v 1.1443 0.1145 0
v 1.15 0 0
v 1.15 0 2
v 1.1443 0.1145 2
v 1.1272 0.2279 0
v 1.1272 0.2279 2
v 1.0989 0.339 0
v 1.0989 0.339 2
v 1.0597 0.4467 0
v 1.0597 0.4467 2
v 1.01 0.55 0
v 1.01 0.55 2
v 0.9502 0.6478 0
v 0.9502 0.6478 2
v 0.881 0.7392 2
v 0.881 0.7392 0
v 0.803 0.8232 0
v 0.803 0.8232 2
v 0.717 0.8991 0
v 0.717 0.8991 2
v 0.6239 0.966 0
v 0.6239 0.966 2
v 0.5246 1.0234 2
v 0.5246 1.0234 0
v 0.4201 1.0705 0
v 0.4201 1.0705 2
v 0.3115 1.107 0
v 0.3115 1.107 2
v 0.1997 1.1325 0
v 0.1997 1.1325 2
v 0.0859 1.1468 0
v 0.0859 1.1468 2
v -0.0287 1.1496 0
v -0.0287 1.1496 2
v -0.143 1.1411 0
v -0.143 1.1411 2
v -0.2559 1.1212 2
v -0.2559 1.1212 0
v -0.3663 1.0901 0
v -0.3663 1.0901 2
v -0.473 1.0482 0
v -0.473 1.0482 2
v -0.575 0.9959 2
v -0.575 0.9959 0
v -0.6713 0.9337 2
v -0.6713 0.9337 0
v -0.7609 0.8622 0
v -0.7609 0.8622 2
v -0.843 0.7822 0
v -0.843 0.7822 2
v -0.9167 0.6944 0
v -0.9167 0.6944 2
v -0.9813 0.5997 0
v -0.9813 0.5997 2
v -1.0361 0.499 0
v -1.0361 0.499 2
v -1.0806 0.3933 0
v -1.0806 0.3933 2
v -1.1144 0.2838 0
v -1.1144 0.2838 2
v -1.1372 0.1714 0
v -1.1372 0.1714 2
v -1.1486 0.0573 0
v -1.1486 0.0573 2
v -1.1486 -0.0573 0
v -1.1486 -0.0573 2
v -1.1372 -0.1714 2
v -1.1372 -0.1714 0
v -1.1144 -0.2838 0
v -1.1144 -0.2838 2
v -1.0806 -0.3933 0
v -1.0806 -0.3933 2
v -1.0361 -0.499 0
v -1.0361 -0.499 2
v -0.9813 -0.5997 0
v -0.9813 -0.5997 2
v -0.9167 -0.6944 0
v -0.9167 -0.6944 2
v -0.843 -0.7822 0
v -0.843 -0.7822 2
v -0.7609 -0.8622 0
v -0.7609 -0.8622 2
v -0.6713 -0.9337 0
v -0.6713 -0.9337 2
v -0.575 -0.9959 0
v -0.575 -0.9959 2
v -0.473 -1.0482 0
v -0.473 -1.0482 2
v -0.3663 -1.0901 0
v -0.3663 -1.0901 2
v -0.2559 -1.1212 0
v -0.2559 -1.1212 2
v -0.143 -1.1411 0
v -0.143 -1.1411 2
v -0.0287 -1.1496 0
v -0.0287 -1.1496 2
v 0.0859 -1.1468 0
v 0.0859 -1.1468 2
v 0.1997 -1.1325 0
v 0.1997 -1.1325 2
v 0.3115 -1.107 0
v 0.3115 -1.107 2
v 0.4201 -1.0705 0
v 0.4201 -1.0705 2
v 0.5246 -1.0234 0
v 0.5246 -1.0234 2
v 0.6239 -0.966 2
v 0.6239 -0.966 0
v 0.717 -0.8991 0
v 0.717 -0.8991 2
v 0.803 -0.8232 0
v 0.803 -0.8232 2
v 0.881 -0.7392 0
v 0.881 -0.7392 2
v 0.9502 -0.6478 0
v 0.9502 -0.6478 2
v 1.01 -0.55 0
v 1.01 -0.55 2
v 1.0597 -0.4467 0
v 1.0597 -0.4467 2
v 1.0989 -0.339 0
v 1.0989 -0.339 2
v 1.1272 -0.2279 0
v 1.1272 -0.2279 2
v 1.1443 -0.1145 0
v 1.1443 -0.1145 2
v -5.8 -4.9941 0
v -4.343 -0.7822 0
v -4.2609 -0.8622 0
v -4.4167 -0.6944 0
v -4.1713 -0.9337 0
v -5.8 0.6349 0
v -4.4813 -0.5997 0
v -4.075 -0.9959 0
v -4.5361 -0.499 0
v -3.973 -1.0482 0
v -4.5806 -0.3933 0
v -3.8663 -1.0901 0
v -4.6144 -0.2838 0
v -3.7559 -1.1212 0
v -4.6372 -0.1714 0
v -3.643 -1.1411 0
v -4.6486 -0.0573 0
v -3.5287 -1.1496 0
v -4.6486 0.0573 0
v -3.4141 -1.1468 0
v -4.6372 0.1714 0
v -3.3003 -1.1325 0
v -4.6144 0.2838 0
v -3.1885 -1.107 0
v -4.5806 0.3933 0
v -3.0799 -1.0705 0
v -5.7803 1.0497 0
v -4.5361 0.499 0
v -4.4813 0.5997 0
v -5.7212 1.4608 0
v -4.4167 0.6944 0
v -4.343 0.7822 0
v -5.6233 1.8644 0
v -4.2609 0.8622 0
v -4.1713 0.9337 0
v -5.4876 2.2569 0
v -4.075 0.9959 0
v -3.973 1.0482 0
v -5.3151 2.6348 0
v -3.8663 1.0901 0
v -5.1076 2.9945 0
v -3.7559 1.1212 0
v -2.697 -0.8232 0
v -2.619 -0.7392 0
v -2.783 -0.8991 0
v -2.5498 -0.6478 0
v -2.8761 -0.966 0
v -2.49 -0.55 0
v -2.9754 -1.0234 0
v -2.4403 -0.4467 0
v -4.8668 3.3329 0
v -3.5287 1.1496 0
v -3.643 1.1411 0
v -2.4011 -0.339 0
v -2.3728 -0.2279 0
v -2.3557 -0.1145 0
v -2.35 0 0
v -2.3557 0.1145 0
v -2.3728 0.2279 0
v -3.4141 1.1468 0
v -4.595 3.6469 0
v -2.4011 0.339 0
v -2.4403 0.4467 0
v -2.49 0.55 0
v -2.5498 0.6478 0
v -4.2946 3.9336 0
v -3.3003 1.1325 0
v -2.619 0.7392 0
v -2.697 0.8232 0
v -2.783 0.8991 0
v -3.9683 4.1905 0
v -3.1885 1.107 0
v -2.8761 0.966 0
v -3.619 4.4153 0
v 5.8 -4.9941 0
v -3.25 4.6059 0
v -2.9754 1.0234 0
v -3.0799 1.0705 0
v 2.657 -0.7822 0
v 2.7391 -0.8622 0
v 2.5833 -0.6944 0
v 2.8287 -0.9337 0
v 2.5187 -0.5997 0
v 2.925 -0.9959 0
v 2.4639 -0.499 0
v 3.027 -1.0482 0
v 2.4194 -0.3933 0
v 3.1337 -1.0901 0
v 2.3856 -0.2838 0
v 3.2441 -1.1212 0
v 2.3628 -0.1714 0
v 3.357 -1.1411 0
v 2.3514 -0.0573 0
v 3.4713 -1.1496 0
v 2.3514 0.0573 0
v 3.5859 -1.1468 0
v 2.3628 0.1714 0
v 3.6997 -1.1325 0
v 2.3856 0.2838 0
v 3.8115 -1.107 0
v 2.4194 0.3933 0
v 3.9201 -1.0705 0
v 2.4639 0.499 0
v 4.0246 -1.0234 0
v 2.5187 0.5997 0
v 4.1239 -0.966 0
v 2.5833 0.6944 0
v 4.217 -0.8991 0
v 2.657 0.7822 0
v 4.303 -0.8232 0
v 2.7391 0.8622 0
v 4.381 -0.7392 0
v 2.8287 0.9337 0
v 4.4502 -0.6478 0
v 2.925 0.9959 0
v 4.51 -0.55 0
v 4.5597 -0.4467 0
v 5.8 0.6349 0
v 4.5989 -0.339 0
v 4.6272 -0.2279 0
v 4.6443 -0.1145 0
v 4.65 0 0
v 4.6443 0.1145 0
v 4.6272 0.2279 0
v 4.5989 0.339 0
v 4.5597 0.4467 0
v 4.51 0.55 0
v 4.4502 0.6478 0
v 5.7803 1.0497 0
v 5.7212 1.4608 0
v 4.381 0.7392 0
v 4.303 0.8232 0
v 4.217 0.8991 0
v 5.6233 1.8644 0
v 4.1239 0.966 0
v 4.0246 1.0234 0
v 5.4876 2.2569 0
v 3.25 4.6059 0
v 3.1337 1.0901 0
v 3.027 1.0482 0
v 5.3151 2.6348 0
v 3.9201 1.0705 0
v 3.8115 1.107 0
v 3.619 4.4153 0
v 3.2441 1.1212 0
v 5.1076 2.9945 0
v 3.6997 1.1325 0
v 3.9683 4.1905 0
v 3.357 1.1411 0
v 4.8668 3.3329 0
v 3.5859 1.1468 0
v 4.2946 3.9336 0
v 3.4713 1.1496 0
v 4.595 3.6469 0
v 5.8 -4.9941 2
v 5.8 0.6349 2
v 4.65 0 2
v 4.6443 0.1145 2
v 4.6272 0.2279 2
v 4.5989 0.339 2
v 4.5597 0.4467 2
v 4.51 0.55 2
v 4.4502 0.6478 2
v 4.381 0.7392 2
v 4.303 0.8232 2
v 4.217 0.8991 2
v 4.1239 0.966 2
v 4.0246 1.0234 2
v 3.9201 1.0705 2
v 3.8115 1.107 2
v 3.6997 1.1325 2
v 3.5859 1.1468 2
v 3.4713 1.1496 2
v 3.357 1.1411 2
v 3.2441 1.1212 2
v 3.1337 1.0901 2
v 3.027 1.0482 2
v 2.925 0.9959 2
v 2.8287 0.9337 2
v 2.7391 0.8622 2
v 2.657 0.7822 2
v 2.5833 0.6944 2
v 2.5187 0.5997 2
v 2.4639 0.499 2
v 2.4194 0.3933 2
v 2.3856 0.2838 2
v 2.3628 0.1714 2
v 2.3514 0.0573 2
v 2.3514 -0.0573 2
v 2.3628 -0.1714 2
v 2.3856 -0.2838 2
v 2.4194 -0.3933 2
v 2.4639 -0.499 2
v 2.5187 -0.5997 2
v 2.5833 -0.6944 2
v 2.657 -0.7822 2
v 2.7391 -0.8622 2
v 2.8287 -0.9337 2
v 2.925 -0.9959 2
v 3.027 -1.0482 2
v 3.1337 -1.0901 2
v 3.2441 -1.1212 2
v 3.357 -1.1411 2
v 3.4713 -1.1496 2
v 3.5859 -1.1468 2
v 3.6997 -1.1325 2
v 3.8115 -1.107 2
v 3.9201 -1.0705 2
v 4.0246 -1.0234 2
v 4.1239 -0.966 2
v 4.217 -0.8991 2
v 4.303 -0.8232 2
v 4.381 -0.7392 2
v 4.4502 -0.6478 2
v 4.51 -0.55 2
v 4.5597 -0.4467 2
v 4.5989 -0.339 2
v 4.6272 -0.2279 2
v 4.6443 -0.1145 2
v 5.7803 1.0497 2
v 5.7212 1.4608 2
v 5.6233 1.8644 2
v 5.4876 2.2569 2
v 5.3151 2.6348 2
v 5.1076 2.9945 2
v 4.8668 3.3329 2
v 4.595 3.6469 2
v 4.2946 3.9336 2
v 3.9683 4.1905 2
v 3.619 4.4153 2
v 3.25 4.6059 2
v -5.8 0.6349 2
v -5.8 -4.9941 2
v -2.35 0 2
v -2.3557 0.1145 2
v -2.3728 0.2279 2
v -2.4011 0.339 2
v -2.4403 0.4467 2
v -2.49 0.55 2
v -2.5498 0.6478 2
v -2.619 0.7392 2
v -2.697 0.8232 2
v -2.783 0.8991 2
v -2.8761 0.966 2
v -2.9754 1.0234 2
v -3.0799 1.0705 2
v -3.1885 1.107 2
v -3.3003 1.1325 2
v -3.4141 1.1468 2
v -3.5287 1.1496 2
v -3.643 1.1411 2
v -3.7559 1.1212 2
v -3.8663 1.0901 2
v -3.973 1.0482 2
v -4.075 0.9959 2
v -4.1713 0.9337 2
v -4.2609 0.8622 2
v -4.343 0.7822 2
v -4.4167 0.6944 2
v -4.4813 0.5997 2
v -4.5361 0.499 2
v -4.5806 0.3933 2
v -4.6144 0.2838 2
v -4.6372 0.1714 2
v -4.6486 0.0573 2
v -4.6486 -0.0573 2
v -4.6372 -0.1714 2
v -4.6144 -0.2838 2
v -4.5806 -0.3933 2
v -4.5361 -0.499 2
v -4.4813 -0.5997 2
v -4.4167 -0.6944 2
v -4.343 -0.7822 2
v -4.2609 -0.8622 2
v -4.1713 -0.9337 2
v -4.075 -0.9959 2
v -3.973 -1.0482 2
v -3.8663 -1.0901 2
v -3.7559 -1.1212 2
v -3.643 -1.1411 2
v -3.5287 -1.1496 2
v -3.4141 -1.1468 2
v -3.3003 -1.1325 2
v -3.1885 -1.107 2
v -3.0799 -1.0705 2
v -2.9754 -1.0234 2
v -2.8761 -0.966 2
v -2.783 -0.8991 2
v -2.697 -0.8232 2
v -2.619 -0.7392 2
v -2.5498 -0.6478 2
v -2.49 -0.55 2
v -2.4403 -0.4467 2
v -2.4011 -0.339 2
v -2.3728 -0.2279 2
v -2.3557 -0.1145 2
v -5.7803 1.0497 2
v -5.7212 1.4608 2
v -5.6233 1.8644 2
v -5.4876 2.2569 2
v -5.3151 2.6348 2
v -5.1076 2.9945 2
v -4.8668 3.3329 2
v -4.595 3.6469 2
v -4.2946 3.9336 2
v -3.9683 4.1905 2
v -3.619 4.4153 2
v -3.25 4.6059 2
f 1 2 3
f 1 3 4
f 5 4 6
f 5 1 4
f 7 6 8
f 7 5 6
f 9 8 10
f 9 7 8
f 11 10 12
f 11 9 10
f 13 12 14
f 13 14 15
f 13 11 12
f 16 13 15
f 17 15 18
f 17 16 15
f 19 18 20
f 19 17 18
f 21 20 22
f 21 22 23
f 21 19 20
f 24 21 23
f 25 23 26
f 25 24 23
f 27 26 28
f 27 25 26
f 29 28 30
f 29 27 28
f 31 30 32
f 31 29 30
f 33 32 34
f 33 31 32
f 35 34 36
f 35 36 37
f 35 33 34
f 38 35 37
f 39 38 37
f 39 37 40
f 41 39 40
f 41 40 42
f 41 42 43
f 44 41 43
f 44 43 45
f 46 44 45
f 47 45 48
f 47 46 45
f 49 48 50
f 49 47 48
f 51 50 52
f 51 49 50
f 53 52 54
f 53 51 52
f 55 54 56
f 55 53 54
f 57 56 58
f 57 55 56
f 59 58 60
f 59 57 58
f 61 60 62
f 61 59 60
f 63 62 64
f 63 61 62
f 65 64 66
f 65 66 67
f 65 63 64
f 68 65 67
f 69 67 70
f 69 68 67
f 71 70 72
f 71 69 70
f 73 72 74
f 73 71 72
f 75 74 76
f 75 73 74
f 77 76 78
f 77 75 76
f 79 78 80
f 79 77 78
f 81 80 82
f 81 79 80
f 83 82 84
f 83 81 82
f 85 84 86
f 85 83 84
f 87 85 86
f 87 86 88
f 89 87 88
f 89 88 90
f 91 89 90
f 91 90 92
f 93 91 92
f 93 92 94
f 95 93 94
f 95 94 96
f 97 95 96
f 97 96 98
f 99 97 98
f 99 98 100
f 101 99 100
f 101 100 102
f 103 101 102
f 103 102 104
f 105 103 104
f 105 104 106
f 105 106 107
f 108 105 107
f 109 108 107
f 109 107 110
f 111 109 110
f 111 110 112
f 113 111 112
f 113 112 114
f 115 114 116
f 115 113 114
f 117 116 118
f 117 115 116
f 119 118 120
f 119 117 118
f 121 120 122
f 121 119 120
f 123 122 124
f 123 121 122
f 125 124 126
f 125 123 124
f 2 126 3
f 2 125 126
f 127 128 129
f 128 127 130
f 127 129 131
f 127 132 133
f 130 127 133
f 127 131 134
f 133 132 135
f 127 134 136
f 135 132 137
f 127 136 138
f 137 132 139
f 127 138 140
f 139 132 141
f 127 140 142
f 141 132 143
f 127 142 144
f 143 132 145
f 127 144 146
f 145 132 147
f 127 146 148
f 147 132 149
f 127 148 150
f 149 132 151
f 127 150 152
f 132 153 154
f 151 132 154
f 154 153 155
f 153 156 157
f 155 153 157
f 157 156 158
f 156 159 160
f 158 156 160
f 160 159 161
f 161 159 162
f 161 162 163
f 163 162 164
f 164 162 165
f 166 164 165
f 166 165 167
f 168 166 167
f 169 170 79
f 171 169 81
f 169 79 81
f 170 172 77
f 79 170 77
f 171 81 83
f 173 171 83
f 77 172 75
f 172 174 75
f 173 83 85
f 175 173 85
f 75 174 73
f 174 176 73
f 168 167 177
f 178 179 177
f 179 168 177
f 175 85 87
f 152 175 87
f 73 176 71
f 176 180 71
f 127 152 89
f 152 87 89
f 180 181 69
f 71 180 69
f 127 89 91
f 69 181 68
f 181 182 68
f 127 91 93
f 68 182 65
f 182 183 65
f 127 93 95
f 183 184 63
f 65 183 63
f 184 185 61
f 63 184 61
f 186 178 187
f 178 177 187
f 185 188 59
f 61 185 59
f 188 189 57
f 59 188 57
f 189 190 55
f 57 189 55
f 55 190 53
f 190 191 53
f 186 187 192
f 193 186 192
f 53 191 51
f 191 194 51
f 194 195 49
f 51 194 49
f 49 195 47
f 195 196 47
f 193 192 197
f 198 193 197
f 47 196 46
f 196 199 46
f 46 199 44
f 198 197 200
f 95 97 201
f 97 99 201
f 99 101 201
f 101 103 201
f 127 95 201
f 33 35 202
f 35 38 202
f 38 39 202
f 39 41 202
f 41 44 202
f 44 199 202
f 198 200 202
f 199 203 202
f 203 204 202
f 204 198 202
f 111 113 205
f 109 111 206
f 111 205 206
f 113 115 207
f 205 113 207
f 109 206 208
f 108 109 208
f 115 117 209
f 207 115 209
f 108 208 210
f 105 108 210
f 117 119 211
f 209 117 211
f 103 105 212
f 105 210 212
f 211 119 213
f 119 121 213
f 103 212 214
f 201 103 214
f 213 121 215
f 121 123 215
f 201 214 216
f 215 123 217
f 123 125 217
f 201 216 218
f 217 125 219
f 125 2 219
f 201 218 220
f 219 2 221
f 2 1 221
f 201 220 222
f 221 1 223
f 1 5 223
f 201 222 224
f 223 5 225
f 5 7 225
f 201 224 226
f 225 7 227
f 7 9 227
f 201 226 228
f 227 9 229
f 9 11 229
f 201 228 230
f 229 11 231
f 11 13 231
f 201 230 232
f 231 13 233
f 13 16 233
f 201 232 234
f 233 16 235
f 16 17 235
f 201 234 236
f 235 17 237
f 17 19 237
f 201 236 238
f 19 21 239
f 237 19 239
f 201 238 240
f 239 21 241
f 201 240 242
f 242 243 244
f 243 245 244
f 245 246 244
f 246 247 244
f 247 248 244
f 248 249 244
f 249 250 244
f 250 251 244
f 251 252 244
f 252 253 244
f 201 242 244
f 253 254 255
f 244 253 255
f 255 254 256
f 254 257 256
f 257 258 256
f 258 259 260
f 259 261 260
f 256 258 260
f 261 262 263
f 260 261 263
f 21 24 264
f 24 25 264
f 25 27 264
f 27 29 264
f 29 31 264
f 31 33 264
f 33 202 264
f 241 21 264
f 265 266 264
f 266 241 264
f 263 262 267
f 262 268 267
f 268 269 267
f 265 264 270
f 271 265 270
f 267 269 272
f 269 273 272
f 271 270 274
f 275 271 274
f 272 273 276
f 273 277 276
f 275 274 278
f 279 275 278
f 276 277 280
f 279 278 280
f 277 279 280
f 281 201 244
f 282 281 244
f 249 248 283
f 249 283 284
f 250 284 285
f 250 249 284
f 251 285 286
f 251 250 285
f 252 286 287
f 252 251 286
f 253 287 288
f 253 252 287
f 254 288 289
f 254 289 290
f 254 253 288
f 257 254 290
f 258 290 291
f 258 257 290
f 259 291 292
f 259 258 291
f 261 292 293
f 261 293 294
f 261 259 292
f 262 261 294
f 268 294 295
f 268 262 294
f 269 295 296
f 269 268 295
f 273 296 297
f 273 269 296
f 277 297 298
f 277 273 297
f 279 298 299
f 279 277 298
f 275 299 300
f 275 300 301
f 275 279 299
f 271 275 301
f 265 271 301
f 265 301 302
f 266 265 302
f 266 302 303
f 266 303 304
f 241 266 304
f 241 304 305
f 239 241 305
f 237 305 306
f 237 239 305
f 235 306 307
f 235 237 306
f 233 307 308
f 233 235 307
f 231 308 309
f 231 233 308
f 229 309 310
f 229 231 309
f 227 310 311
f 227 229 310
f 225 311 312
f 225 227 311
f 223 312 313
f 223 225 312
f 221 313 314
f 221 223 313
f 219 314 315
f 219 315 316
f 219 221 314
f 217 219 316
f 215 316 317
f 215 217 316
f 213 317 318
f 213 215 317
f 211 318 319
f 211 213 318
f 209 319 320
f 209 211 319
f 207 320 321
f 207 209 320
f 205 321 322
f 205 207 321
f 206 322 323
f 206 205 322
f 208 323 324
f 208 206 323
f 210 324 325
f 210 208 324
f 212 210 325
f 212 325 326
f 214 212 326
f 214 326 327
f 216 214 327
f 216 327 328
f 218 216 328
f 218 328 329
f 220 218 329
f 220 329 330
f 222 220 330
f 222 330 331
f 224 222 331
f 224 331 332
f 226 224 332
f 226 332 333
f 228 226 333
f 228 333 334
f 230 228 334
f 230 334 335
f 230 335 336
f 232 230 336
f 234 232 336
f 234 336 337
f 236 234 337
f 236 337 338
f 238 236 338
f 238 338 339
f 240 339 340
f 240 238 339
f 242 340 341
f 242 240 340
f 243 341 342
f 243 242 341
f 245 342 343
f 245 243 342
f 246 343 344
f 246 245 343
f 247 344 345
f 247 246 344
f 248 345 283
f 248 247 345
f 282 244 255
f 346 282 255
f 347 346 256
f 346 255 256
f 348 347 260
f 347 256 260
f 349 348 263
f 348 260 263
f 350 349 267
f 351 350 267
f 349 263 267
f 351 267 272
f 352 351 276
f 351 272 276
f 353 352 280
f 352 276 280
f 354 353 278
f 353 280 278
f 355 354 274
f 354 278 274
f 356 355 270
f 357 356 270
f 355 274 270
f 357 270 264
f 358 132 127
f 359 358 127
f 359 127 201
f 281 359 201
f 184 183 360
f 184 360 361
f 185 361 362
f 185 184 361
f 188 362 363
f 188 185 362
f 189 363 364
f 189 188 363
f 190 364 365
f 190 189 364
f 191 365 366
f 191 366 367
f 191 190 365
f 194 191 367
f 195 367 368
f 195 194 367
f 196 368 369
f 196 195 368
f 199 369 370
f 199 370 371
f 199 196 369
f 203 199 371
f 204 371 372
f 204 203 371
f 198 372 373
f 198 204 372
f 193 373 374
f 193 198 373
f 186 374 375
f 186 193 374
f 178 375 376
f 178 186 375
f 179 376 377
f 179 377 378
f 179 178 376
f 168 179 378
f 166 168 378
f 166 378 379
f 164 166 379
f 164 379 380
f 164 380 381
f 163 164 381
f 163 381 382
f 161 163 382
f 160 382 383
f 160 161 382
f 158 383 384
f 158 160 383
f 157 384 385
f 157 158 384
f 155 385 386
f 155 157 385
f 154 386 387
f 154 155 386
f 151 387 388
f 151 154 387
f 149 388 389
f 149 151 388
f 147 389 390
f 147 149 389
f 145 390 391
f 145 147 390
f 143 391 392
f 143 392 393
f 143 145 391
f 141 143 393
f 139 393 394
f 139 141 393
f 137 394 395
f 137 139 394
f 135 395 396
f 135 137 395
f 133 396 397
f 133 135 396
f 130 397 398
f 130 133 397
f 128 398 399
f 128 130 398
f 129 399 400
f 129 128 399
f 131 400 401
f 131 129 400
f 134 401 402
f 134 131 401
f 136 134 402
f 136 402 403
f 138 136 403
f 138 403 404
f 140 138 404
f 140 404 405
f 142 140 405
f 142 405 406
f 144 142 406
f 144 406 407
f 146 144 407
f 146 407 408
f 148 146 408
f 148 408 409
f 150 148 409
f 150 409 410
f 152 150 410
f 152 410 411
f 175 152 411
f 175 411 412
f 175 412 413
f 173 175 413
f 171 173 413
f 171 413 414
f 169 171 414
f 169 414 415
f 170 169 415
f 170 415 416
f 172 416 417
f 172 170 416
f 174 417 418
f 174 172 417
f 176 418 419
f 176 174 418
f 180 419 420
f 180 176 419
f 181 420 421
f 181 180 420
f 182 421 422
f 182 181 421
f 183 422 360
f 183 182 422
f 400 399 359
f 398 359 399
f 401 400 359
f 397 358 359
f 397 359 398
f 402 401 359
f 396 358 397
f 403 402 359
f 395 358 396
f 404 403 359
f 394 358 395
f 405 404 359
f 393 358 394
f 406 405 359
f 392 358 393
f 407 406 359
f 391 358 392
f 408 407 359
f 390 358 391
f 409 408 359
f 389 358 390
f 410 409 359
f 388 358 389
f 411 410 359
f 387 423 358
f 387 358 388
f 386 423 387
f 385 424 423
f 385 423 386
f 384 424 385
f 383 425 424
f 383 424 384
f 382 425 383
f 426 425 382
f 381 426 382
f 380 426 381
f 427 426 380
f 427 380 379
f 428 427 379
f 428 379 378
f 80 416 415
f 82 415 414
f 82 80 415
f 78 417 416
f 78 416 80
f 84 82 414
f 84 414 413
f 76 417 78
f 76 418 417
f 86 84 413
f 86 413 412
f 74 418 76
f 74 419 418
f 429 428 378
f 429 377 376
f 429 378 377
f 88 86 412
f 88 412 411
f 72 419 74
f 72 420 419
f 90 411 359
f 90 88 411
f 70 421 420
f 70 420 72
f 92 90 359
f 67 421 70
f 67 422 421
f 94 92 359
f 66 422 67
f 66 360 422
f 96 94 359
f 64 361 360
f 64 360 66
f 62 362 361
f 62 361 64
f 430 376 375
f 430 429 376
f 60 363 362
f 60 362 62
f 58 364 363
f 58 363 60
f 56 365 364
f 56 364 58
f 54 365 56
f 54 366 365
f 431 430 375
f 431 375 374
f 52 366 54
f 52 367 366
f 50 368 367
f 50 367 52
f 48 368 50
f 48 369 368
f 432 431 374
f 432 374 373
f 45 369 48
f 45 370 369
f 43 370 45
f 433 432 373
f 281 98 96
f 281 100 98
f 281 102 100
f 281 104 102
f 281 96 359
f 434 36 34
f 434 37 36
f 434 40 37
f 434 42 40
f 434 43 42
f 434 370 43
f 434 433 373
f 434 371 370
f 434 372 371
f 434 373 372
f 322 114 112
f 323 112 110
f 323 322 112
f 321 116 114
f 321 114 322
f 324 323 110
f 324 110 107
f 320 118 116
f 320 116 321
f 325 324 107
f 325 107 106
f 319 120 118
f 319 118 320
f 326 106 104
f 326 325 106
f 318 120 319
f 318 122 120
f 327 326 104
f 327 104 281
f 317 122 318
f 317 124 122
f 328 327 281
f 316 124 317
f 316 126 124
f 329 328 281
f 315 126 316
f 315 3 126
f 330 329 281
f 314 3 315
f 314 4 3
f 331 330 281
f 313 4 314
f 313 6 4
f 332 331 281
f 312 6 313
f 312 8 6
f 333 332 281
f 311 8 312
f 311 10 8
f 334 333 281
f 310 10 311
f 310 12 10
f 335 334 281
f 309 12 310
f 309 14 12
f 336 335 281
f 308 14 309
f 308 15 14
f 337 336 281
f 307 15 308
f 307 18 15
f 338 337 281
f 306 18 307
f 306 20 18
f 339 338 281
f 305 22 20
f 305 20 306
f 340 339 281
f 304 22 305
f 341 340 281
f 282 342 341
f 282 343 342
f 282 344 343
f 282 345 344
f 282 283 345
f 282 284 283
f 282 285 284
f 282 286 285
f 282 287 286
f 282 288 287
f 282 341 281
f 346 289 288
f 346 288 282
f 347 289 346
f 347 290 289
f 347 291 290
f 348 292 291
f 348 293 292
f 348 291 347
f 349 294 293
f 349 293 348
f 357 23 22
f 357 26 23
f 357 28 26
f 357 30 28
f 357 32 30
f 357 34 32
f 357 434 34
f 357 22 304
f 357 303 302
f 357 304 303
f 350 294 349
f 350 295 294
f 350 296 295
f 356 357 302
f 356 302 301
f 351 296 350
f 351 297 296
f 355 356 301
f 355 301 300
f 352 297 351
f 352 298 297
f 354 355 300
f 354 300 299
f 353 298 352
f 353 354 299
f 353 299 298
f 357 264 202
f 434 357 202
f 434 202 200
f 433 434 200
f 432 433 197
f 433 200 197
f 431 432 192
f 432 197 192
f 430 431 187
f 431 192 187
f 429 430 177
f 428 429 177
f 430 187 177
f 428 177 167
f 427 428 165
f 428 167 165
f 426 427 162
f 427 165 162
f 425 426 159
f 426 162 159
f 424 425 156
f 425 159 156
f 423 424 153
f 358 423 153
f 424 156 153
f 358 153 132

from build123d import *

# Parameters (mm, degrees)
SZKIC1_R                    = 1.15
DODANIE_WYCI_GNI_CIE1_DEPTH = 2


with BuildPart() as part:
    # Szkic1 → Dodanie-wyciągnięcie1 (new body)
    with BuildSketch(Plane.XY):
        with BuildLine():
            Line((-5.8, -4.994143627), (5.8, -4.994143627))
            Line((5.8, -4.994143627), (5.8, 0.63488027))
            ThreePointArc((5.8, 0.63488027), (5.10760912, 2.994496299), (3.25, 4.605856373))
            Line((3.25, 4.605856373), (-3.25, 4.605856373))
            ThreePointArc((-3.25, 4.605856373), (-5.10760912, 2.994496299), (-5.8, 0.63488027))
            Line((-5.8, 0.63488027), (-5.8, -4.994143627))
        make_face()
        Circle(SZKIC1_R, mode=Mode.SUBTRACT)
        with Locations((3.5, 0)):
            Circle(SZKIC1_R, mode=Mode.SUBTRACT)
        with Locations((-3.5, 0)):
            Circle(SZKIC1_R, mode=Mode.SUBTRACT)
    extrude(amount=DODANIE_WYCI_GNI_CIE1_DEPTH)


solid = part.part
